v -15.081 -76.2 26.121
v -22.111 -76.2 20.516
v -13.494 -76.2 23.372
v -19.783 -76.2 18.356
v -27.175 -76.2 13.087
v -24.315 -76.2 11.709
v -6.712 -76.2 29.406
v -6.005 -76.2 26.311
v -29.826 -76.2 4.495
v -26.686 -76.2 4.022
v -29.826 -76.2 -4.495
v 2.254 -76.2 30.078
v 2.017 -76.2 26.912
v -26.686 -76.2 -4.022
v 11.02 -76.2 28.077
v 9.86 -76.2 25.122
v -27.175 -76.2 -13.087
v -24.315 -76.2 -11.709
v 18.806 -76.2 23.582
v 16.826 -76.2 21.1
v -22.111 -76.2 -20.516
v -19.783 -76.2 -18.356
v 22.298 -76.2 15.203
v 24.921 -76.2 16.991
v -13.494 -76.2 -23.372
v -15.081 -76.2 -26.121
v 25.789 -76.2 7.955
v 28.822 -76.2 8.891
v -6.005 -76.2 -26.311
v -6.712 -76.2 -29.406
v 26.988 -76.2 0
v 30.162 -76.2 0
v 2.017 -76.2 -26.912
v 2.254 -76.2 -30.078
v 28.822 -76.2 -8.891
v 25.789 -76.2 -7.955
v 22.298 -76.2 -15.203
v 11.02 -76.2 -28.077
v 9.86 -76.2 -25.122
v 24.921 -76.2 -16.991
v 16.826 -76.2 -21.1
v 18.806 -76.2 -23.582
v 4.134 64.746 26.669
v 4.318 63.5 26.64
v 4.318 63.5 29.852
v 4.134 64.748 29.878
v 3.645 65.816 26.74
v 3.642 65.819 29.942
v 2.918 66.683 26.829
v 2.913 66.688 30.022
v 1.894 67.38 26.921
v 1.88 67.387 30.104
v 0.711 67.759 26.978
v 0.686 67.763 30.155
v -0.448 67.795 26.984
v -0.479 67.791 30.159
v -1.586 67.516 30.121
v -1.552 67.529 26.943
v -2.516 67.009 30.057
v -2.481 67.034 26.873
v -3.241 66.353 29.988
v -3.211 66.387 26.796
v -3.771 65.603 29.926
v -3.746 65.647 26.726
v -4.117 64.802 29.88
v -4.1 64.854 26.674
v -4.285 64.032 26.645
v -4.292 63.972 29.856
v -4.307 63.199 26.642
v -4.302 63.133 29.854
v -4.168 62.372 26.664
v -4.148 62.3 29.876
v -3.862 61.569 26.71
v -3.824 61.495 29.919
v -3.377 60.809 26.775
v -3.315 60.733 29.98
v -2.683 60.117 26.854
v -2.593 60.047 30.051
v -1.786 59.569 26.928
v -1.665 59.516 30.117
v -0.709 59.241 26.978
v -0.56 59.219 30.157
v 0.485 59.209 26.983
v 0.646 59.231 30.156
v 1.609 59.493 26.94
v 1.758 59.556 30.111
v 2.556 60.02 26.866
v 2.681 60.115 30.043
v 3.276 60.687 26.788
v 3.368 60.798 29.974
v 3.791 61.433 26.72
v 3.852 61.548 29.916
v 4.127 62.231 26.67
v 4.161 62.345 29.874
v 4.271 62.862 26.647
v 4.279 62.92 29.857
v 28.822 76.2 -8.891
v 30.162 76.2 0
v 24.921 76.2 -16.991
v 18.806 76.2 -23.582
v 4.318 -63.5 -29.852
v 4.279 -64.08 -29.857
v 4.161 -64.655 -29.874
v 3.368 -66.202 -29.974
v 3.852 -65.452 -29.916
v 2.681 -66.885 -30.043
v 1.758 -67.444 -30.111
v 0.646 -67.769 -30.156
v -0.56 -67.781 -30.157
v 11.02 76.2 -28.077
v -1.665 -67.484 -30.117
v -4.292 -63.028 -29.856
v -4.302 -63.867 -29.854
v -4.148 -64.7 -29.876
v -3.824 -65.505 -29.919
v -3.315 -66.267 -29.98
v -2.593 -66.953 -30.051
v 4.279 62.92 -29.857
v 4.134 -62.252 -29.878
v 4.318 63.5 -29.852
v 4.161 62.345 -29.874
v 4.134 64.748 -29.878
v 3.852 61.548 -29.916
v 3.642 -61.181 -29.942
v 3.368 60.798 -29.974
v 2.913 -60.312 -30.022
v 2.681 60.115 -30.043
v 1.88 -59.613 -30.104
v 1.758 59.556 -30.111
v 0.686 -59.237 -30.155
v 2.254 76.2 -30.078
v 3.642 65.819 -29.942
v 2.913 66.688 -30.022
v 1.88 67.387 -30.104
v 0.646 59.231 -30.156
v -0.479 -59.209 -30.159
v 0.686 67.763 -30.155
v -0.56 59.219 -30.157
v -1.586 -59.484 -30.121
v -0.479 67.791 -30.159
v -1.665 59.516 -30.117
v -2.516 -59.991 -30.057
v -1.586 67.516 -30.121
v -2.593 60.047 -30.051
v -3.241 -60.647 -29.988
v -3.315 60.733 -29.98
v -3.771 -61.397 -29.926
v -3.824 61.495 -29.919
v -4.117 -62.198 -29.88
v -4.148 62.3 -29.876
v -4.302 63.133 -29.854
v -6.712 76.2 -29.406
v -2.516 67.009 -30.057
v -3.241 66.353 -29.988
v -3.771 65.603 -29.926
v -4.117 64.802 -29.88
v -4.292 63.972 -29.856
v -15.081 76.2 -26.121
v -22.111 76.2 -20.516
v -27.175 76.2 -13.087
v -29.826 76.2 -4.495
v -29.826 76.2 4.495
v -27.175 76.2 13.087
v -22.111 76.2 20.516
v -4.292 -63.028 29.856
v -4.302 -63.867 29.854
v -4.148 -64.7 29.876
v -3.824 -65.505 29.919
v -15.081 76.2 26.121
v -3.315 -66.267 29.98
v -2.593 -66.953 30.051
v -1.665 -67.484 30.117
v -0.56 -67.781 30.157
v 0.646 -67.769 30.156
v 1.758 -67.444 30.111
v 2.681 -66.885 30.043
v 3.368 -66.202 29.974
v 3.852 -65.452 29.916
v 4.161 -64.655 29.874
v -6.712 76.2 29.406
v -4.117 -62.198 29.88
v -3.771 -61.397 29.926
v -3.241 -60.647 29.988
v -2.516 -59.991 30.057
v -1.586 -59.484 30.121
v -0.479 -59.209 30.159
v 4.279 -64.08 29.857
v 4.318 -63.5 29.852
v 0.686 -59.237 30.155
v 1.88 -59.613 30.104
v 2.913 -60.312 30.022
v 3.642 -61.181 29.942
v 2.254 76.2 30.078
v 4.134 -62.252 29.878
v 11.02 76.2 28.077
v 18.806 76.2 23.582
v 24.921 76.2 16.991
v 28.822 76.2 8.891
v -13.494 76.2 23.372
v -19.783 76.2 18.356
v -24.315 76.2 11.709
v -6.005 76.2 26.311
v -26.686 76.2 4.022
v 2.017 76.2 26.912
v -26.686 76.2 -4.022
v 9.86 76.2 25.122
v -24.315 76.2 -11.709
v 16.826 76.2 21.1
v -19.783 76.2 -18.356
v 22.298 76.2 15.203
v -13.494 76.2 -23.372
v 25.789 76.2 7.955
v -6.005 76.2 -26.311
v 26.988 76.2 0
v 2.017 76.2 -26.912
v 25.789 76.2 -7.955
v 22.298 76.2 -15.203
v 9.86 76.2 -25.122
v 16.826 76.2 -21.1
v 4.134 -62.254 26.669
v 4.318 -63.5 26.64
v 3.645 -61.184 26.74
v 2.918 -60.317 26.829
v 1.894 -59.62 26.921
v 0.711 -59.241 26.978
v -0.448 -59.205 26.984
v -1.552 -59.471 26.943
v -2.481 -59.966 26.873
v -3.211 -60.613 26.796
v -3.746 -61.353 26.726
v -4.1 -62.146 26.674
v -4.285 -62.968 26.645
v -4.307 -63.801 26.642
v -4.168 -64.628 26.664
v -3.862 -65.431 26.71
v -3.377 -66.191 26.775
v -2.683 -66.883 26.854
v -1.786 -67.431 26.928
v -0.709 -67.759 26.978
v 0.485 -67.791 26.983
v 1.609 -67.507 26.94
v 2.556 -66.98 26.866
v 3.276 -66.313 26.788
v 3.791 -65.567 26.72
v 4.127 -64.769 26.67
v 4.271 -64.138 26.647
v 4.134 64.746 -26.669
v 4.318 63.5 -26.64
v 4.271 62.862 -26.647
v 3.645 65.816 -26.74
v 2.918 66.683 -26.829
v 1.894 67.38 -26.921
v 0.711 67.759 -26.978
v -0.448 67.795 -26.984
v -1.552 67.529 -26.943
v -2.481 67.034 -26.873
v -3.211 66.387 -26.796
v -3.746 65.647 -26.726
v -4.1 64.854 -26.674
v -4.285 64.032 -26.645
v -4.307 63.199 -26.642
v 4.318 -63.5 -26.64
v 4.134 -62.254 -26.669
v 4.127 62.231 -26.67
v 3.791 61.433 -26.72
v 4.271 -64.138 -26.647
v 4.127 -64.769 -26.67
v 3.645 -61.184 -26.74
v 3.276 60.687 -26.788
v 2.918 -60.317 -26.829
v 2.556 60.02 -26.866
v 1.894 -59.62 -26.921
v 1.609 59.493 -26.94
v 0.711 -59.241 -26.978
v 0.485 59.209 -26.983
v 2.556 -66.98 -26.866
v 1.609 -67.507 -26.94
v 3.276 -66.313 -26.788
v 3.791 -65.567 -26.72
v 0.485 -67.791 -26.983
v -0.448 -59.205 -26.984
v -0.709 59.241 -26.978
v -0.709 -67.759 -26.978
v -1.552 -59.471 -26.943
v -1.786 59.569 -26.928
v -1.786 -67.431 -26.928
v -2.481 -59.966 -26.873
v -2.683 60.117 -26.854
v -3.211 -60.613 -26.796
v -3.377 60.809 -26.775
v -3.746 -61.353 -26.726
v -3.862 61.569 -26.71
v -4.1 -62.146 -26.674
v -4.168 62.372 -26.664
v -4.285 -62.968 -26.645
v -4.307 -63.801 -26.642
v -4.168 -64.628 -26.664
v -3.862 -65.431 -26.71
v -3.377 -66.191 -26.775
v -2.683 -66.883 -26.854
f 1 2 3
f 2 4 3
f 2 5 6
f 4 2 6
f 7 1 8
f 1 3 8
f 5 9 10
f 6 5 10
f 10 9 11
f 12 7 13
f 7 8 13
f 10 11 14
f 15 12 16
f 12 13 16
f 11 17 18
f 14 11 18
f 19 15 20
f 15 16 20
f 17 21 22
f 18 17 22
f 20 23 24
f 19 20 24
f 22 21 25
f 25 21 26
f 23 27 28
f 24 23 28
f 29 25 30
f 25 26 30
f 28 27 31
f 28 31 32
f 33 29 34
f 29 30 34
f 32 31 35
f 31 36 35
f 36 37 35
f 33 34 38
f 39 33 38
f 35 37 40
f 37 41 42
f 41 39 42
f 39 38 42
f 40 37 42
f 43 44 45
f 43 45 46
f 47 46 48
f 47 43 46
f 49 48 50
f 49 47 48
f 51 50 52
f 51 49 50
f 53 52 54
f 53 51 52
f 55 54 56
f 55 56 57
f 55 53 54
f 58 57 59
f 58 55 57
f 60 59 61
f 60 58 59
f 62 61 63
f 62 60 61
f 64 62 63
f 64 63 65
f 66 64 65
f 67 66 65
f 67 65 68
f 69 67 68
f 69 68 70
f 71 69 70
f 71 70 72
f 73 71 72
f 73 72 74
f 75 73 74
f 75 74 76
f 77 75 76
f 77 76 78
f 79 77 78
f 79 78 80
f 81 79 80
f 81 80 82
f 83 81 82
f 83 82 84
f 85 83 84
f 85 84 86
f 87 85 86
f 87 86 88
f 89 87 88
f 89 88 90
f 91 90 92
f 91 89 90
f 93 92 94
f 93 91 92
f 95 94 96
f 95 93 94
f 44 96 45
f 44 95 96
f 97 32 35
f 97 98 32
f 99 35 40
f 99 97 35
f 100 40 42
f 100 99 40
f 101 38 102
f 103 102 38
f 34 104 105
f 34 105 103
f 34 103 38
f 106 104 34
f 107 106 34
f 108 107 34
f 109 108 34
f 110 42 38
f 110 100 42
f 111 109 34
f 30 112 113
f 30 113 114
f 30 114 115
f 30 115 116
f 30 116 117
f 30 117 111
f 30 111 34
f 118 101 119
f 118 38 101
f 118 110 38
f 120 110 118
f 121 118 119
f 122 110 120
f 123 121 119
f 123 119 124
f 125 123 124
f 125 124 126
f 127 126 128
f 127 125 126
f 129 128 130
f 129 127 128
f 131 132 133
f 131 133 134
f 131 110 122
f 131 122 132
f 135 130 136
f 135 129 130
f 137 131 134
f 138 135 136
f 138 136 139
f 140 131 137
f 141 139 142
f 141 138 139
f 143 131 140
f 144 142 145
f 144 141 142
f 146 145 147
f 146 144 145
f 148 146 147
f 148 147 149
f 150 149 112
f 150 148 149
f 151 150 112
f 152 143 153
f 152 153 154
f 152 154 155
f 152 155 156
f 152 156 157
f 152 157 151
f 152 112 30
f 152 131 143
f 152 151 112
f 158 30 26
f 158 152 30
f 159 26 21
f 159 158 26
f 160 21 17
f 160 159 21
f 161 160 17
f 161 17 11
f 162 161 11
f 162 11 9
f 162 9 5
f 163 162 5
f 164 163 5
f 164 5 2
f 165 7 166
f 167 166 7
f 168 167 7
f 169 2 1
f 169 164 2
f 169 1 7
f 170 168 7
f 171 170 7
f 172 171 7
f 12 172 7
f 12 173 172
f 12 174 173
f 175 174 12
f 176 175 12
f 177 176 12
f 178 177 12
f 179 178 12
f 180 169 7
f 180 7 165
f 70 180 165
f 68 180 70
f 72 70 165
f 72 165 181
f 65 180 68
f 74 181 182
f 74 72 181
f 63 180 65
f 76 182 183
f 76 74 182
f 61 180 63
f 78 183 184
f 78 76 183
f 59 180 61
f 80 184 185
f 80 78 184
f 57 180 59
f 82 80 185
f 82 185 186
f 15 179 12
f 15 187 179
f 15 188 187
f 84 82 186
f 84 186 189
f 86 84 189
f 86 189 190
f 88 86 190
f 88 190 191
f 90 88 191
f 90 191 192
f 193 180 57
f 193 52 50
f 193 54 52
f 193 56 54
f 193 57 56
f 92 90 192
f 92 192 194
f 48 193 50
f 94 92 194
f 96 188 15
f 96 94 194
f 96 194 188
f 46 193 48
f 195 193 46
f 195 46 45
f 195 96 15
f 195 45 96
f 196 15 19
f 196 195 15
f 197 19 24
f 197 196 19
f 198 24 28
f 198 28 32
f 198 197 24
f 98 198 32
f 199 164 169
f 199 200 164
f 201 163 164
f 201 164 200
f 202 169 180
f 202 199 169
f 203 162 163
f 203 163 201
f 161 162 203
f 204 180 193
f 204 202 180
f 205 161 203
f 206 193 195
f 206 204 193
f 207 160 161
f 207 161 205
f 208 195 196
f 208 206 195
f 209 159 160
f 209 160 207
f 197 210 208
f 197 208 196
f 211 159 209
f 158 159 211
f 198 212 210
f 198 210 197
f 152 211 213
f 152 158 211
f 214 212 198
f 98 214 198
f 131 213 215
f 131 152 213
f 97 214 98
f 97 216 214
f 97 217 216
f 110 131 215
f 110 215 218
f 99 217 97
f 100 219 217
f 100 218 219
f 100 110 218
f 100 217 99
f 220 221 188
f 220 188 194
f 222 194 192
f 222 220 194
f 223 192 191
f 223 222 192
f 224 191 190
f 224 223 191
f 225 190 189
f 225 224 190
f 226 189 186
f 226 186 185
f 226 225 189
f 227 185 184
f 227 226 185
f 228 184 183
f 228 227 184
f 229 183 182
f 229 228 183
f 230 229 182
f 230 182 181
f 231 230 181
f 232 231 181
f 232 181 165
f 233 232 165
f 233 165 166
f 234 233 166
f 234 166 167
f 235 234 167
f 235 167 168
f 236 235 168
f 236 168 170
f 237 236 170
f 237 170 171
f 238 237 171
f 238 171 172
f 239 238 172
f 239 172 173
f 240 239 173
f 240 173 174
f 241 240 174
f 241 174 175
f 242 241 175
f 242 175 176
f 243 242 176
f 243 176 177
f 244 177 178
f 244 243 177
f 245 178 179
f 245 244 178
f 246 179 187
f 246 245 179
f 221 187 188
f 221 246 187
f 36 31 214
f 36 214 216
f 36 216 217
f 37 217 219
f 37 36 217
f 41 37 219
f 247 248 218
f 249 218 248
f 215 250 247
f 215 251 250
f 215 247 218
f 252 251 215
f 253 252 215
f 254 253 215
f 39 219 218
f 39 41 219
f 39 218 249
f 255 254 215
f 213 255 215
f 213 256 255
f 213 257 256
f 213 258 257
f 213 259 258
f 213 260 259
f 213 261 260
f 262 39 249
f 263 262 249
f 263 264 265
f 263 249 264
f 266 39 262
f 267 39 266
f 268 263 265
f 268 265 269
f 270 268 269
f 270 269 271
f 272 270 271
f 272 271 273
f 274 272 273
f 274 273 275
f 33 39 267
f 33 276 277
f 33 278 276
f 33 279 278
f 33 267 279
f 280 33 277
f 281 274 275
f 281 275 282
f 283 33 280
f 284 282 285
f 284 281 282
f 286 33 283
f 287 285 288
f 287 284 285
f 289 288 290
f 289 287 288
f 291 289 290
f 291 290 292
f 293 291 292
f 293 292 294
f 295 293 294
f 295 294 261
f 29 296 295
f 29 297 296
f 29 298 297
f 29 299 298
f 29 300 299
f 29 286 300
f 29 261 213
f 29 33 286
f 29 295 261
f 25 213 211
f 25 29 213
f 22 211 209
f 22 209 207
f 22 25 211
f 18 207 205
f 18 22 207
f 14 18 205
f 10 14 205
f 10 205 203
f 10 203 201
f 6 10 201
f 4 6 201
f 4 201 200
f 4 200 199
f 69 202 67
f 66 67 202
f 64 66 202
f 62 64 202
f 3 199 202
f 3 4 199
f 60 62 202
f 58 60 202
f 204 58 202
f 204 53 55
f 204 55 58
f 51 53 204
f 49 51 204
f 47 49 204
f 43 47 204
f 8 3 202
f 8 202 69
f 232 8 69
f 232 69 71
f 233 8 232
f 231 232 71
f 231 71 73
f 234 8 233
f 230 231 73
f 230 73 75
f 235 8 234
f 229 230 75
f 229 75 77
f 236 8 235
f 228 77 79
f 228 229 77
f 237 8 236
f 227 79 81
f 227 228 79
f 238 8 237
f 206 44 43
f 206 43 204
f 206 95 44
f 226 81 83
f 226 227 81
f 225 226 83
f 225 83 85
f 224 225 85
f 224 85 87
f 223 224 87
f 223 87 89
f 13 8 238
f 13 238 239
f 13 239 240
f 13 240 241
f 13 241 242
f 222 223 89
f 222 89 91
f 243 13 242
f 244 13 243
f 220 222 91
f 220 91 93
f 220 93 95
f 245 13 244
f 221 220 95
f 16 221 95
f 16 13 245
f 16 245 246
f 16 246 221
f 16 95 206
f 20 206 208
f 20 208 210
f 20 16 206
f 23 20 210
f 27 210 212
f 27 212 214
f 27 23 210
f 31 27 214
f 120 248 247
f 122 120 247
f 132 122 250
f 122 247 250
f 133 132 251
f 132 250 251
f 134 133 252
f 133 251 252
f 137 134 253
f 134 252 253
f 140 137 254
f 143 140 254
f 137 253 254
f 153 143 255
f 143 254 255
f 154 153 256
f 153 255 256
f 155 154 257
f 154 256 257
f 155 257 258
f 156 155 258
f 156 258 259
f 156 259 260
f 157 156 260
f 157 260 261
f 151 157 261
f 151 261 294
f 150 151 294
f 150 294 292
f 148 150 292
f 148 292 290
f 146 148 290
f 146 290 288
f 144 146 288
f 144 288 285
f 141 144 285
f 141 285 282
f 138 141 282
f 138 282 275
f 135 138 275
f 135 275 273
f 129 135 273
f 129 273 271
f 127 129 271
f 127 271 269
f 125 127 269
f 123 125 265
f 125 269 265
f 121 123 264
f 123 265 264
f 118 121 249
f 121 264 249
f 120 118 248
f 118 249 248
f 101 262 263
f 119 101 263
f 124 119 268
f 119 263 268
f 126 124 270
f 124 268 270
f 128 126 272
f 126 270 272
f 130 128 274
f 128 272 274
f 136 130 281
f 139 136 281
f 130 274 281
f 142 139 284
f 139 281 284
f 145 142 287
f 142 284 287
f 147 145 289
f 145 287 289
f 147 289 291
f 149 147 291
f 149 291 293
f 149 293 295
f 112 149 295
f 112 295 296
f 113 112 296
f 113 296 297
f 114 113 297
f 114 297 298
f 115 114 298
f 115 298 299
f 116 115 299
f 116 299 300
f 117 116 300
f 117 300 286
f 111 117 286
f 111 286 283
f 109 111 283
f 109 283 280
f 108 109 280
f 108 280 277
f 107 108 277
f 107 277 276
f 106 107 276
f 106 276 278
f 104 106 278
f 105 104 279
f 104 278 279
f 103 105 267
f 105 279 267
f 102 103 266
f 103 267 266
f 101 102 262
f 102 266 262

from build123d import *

# Parameters (mm, degrees)
BOSS_EXTRUDE1_DEPTH            = 76.2
BOSS_EXTRUDE1_DEPTH_BACK       = 76.2
SKETCH1_R                      = 30.1625
SKETCH1_R_2                    = 26.9875
CUT_EXTRUDE1_REACH             = 89.327
SKETCH2_R                      = 4.318
CUT_EXTRUDE1_DIRECTION_2_REACH = 89.327


with BuildPart() as part:
    # Sketch1 → Boss-Extrude1 (new, two sides: drawn at the far end of the back side and taken through both)
    with BuildSketch(Plane(origin=(0, 0, 0), x_dir=(1, 0, 0), z_dir=(0, 1, 0)).offset(-BOSS_EXTRUDE1_DEPTH_BACK)):
        Circle(SKETCH1_R)
        Circle(SKETCH1_R_2, mode=Mode.SUBTRACT)
    extrude(amount=BOSS_EXTRUDE1_DEPTH + BOSS_EXTRUDE1_DEPTH_BACK)

    # Sketch2 → Cut-Extrude1 (cut, up to next)
    with BuildSketch(Plane.XY, mode=Mode.PRIVATE) as cut_extrude1_sk1:
        with Locations((0, 63.5)):
            Circle(SKETCH2_R)
    cut_extrude1_tool1 = extrude(cut_extrude1_sk1.sketch, amount=-CUT_EXTRUDE1_REACH, mode=Mode.PRIVATE) & part.part
    # Sketch2 → Cut-Extrude1 (cut, up to next)
    with BuildSketch(Plane.XY, mode=Mode.PRIVATE) as cut_extrude1_sk2:
        with Locations((0, -63.5)):
            Circle(SKETCH2_R)
    cut_extrude1_tool2 = extrude(cut_extrude1_sk2.sketch, amount=-CUT_EXTRUDE1_REACH, mode=Mode.PRIVATE) & part.part
    add(cut_extrude1_tool1.solids().sort_by_distance((0, 63.5, 0))[0], mode=Mode.SUBTRACT)
    add(cut_extrude1_tool2.solids().sort_by_distance((0, -63.5, 0))[0], mode=Mode.SUBTRACT)

    # Sketch2 → Cut-Extrude1 direction 2 (cut, up to next)
    with BuildSketch(Plane.XY, mode=Mode.PRIVATE) as cut_extrude1_direction_2_sk1:
        with Locations((0, 63.5)):
            Circle(SKETCH2_R)
    cut_extrude1_direction_2_tool1 = extrude(cut_extrude1_direction_2_sk1.sketch, amount=CUT_EXTRUDE1_DIRECTION_2_REACH, mode=Mode.PRIVATE) & part.part
    # Sketch2 → Cut-Extrude1 direction 2 (cut, up to next)
    with BuildSketch(Plane.XY, mode=Mode.PRIVATE) as cut_extrude1_direction_2_sk2:
        with Locations((0, -63.5)):
            Circle(SKETCH2_R)
    cut_extrude1_direction_2_tool2 = extrude(cut_extrude1_direction_2_sk2.sketch, amount=CUT_EXTRUDE1_DIRECTION_2_REACH, mode=Mode.PRIVATE) & part.part
    add(cut_extrude1_direction_2_tool1.solids().sort_by_distance((0, 63.5, 0))[0], mode=Mode.SUBTRACT)
    add(cut_extrude1_direction_2_tool2.solids().sort_by_distance((0, -63.5, 0))[0], mode=Mode.SUBTRACT)


solid = part.part
